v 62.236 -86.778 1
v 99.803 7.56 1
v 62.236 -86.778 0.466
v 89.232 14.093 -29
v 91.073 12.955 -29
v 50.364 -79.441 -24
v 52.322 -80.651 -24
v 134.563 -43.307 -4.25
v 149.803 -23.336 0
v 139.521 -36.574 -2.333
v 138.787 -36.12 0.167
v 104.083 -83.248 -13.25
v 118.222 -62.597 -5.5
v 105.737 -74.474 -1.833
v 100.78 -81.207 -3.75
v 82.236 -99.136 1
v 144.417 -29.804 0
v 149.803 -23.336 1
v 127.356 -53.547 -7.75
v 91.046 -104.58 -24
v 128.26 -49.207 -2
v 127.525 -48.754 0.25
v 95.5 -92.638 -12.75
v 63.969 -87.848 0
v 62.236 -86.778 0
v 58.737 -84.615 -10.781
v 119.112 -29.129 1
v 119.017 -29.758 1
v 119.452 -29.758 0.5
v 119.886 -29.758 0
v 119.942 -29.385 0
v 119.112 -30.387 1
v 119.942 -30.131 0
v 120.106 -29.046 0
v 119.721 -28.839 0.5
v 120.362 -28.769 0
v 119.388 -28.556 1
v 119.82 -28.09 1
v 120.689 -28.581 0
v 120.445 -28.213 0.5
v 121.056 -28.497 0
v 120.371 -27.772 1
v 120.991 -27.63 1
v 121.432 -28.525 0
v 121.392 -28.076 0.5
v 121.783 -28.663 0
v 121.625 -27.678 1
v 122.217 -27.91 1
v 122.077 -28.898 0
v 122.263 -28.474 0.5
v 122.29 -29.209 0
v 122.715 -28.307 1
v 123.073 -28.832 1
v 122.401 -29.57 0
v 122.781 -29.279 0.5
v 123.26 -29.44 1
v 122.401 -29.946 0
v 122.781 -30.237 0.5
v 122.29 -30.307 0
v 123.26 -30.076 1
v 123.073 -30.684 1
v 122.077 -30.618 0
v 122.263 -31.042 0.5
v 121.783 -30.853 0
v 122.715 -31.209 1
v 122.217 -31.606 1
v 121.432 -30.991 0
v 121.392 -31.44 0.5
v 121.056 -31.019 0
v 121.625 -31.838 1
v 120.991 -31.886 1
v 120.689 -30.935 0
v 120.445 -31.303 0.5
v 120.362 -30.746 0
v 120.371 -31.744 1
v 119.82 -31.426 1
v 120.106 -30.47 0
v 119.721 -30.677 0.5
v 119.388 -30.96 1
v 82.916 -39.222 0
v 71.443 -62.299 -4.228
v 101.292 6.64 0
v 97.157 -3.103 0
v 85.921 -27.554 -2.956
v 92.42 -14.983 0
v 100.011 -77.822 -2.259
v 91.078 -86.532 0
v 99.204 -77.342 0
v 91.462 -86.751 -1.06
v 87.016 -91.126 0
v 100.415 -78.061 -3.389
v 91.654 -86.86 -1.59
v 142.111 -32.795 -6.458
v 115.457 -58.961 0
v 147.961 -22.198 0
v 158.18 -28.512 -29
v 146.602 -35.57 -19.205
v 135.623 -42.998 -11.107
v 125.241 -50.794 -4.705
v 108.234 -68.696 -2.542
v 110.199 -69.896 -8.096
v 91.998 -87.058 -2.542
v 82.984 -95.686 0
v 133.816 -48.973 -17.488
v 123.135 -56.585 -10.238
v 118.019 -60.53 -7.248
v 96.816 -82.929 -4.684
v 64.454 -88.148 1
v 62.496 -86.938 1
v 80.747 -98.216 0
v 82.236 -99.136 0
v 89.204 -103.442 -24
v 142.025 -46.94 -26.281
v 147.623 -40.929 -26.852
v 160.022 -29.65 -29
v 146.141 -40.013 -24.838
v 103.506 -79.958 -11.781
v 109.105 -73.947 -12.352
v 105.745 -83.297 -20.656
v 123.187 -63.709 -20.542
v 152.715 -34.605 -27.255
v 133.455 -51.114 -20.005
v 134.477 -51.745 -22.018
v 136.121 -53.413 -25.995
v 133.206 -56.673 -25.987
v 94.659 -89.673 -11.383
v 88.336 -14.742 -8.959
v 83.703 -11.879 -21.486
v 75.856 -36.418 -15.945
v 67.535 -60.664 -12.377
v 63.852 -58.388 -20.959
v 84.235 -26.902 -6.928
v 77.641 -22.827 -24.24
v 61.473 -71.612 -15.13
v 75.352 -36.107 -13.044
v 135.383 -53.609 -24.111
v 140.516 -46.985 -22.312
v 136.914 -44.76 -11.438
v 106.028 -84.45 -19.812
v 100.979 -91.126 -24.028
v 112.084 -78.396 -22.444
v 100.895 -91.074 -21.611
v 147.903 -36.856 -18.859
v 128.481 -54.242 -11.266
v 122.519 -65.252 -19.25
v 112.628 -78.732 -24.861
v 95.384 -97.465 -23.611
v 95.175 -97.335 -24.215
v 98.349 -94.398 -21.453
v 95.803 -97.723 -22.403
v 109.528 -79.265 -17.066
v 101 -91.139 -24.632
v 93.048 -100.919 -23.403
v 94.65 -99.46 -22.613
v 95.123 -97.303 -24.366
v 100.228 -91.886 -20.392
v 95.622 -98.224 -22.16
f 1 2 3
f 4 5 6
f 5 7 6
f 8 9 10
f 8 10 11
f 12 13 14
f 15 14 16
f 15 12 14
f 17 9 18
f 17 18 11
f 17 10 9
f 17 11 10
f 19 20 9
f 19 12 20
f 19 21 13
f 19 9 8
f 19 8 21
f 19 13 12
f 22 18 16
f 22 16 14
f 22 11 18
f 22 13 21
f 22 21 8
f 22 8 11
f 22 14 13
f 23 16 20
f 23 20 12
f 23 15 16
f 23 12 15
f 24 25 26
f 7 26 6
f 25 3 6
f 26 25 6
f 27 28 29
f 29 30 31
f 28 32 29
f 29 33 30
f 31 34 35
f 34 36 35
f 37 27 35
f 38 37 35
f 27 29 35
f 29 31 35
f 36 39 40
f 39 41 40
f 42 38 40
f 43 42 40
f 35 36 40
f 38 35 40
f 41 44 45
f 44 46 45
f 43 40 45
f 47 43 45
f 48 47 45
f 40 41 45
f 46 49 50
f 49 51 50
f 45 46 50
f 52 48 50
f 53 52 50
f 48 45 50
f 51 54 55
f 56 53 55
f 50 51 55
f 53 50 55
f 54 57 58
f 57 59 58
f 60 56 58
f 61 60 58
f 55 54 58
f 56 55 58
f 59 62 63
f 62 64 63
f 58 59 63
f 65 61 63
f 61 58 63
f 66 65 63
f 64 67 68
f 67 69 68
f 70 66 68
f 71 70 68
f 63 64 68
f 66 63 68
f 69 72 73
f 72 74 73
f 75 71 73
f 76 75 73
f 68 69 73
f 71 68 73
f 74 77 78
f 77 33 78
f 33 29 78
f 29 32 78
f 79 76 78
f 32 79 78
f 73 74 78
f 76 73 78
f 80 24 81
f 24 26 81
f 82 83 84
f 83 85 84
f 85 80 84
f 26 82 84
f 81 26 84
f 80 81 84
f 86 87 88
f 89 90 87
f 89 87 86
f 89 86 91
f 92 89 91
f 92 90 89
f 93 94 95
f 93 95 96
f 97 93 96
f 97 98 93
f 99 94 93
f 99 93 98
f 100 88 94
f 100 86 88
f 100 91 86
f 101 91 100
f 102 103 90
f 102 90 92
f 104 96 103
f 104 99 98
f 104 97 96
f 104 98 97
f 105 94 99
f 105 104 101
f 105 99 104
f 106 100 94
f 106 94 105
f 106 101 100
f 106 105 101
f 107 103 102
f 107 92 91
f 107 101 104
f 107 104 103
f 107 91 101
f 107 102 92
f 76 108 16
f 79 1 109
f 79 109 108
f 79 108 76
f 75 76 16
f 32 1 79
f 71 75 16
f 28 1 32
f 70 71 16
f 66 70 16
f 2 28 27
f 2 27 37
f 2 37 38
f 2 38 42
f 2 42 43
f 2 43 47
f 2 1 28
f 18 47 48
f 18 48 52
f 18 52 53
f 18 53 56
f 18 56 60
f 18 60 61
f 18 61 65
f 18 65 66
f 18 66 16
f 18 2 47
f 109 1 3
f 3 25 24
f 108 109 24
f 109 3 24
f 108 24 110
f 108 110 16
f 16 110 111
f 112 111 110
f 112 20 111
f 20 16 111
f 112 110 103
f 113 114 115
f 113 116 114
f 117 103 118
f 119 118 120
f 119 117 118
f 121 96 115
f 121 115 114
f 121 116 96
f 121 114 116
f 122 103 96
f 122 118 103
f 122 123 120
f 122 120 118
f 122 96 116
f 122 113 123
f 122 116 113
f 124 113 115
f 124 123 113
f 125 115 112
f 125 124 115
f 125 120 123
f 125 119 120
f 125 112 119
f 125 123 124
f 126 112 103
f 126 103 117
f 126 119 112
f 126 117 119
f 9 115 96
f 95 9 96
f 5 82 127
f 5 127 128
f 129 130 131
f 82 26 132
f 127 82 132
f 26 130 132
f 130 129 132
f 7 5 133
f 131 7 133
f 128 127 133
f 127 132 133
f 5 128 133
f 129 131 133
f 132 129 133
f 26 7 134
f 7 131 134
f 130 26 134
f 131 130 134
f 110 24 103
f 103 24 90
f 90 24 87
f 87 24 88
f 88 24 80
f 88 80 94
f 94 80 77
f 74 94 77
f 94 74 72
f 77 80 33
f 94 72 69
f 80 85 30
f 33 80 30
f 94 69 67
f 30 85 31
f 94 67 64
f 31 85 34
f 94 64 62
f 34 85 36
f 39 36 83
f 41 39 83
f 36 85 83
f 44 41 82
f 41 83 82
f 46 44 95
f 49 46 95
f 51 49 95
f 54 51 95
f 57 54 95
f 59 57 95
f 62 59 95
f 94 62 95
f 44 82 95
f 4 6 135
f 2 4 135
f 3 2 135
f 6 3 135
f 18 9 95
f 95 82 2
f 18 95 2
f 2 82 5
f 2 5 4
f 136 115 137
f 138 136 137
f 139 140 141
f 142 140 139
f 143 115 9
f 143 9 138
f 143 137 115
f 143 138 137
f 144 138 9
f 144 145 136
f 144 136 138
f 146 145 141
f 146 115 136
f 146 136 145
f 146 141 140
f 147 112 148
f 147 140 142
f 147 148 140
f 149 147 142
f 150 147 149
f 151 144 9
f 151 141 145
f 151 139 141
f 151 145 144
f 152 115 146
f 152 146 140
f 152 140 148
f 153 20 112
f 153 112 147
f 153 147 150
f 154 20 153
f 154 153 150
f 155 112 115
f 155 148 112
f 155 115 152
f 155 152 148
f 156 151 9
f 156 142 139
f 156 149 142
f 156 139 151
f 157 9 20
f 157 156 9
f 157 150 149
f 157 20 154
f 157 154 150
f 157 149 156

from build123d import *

# Parameters (mm, degrees)
BOSS_EXTRUDE1_DEPTH                               = 1
CSK_FOR_1_FLAT_HEAD_SOCKET_CAP_SCREW1_D           = 2.0574
CSK_FOR_1_FLAT_HEAD_SOCKET_CAP_SCREW1_CSINK_D     = 4.2672
CSK_FOR_1_FLAT_HEAD_SOCKET_CAP_SCREW1_CSINK_ANGLE = 82


with BuildPart() as part:
    # Sketch1 → Boss-Extrude1 (new body)
    with BuildSketch(Plane.XY):
        Polygon((99.80287108, 7.560475543), (62.236469572, -86.777626616), (82.236469572, -99.136126436), (149.80287108, -23.335774006), align=None)
    extrude(amount=BOSS_EXTRUDE1_DEPTH)

    # Loft3: read off the stored shape, not the designer's step
    # Loft3: loft between two sections, ruled curve by curve
    loft3_from = [
        Edge.make_bspline([(158.179985747, -28.512202511, -29), (158.486913307, -28.701860721, -29), (158.793840868, -28.891518931, -29), (159.407695988, -29.270835351, -29), (159.714623549, -29.460493561, -29), (160.021551109, -29.650151771, -29)], [0, 0, 0, 0, 0.5, 0.5, 1, 1, 1, 1], 3),
        Edge.make_bspline([(147.608937441, -21.980087582, 1), (149.370778826, -23.068773403, -4), (151.13262021, -24.157459225, -9), (154.656302978, -26.334830868, -19), (156.418144363, -27.423516689, -24), (158.179985747, -28.512202511, -29)], [0, 0, 0, 0, 0.5, 0.5, 1, 1, 1, 1], 3),
        Edge.make_bspline([(160.021551109, -29.650151771, -29), (158.318437771, -28.597755477, -24.166666667), (156.615324433, -27.545359183, -19.333333333), (153.209097757, -25.440566594, -9.666666667), (151.505984418, -24.3881703, -4.833333333), (149.80287108, -23.335774006, 0)], [0, 0, 0, 0, 0.5, 0.5, 1, 1, 1, 1], 3),
        Edge.make_bspline([(149.80287108, -23.335774006, 0), (149.80287108, -23.335774006, 0.166666667), (149.80287108, -23.335774006, 0.333333333), (149.80287108, -23.335774006, 0.666666667), (149.80287108, -23.335774006, 0.833333333), (149.80287108, -23.335774006, 1)], [0, 0, 0, 0, 0.5, 0.5, 1, 1, 1, 1], 3),
        Edge.make_line((149.80287108, -23.335774006, 1), (147.608937441, -21.980087582, 1)),
    ]
    loft3_to = [
        Edge.make_bspline([(80.395510173, -97.998551616, 0.998280313), (81.863610332, -98.905727394, -3.168099739), (83.331710492, -99.812903172, -7.334479791), (86.267910812, -101.627254727, -15.667239896), (87.736010971, -102.534430505, -19.833619948), (89.204111131, -103.441606283, -24)], [0, 0, 0, 0, 0.5, 0.5, 1, 1, 1, 1], 3),
        Edge.make_bspline([(80.395510173, -97.998551616, 1), (80.395510173, -97.998551616, 0.99971966), (80.395510173, -97.998551616, 0.999436182), (80.395510173, -97.998551616, 0.998862953), (80.395510173, -97.998551616, 0.998573202), (80.395510173, -97.998551616, 0.998280313)], [0, 0, 0, 0, 0.5, 0.5, 1, 1, 1, 1], 3),
        Edge.make_bspline([(89.204111131, -103.441606283, -24), (89.511038691, -103.631264493, -24), (89.817966252, -103.820922703, -24), (90.431821372, -104.200239123, -24), (90.738748933, -104.389897333, -24), (91.045676493, -104.579555543, -24)], [0, 0, 0, 0, 0.5, 0.5, 1, 1, 1, 1], 3),
        Edge.make_bspline([(91.045676493, -104.579555543, -24), (89.57747534, -103.672317359, -19.833333333), (88.109274186, -102.765079174, -15.666666667), (85.172871879, -100.950602805, -7.333333333), (83.704670725, -100.04336462, -3.166666667), (82.236469572, -99.136126436, 1)], [0, 0, 0, 0, 0.5, 0.5, 1, 1, 1, 1], 3),
        Edge.make_line((82.236469572, -99.136126436, 1), (80.395510173, -97.998551616, 1)),
    ]
    loft3 = Solid(Shell([*[Face.make_surface_from_curves(loft3_from[k], loft3_to[k]) for k in range(5)], Face(Wire(loft3_from)), Face(Wire(loft3_to))]))
    add(loft3)

    # Sketch12 → Loft4 section 0
    with BuildSketch(Plane(origin=(30.958675209, 50.101024656, 0), x_dir=(0.8506922729426725, -0.5256640150853298, 0), z_dir=(0.5256640150853298, 0.8506922729426725, 0))):
        with BuildLine():
            Line((82.677832154, -1), (82.677832154, 0))
            Line((82.677832154, 0), (70.665638845, 29))
            Line((70.665638845, 29), (68.500854444, 29))
            Line((68.500854444, 29), (80.927261316, -1))
            Line((80.927261316, -1), (82.677832154, -1))
        make_face()
    # Sketch13 → Loft4 section 1
    with BuildSketch(Plane(origin=(-21.6077263, -34.968202638, 0), x_dir=(-0.8506922729426724, 0.52566401508533, 0), z_dir=(-0.52566401508533, -0.8506922729426724, 0))):
        with BuildLine():
            Line((-98.864477851, -1), (-84.60323453, 24))
            Line((-84.60323453, 24), (-86.905766091, 24))
            Line((-86.905766091, 24), (-94.44679393, 10.780556805))
            Line((-94.44679393, 10.780556805), (-101.167009412, -1))
            Line((-101.167009412, -1), (-98.864477851, -1))
        make_face()
    loft()

    # CSK for #1 Flat Head Socket Cap Screw1 (through all)
    with Locations(Plane.XY.offset(1)):
        with Locations((121.150579346, -29.757979407)):
            CounterSinkHole(CSK_FOR_1_FLAT_HEAD_SOCKET_CAP_SCREW1_D / 2, CSK_FOR_1_FLAT_HEAD_SOCKET_CAP_SCREW1_CSINK_D / 2, counter_sink_angle=CSK_FOR_1_FLAT_HEAD_SOCKET_CAP_SCREW1_CSINK_ANGLE)


solid = part.part
